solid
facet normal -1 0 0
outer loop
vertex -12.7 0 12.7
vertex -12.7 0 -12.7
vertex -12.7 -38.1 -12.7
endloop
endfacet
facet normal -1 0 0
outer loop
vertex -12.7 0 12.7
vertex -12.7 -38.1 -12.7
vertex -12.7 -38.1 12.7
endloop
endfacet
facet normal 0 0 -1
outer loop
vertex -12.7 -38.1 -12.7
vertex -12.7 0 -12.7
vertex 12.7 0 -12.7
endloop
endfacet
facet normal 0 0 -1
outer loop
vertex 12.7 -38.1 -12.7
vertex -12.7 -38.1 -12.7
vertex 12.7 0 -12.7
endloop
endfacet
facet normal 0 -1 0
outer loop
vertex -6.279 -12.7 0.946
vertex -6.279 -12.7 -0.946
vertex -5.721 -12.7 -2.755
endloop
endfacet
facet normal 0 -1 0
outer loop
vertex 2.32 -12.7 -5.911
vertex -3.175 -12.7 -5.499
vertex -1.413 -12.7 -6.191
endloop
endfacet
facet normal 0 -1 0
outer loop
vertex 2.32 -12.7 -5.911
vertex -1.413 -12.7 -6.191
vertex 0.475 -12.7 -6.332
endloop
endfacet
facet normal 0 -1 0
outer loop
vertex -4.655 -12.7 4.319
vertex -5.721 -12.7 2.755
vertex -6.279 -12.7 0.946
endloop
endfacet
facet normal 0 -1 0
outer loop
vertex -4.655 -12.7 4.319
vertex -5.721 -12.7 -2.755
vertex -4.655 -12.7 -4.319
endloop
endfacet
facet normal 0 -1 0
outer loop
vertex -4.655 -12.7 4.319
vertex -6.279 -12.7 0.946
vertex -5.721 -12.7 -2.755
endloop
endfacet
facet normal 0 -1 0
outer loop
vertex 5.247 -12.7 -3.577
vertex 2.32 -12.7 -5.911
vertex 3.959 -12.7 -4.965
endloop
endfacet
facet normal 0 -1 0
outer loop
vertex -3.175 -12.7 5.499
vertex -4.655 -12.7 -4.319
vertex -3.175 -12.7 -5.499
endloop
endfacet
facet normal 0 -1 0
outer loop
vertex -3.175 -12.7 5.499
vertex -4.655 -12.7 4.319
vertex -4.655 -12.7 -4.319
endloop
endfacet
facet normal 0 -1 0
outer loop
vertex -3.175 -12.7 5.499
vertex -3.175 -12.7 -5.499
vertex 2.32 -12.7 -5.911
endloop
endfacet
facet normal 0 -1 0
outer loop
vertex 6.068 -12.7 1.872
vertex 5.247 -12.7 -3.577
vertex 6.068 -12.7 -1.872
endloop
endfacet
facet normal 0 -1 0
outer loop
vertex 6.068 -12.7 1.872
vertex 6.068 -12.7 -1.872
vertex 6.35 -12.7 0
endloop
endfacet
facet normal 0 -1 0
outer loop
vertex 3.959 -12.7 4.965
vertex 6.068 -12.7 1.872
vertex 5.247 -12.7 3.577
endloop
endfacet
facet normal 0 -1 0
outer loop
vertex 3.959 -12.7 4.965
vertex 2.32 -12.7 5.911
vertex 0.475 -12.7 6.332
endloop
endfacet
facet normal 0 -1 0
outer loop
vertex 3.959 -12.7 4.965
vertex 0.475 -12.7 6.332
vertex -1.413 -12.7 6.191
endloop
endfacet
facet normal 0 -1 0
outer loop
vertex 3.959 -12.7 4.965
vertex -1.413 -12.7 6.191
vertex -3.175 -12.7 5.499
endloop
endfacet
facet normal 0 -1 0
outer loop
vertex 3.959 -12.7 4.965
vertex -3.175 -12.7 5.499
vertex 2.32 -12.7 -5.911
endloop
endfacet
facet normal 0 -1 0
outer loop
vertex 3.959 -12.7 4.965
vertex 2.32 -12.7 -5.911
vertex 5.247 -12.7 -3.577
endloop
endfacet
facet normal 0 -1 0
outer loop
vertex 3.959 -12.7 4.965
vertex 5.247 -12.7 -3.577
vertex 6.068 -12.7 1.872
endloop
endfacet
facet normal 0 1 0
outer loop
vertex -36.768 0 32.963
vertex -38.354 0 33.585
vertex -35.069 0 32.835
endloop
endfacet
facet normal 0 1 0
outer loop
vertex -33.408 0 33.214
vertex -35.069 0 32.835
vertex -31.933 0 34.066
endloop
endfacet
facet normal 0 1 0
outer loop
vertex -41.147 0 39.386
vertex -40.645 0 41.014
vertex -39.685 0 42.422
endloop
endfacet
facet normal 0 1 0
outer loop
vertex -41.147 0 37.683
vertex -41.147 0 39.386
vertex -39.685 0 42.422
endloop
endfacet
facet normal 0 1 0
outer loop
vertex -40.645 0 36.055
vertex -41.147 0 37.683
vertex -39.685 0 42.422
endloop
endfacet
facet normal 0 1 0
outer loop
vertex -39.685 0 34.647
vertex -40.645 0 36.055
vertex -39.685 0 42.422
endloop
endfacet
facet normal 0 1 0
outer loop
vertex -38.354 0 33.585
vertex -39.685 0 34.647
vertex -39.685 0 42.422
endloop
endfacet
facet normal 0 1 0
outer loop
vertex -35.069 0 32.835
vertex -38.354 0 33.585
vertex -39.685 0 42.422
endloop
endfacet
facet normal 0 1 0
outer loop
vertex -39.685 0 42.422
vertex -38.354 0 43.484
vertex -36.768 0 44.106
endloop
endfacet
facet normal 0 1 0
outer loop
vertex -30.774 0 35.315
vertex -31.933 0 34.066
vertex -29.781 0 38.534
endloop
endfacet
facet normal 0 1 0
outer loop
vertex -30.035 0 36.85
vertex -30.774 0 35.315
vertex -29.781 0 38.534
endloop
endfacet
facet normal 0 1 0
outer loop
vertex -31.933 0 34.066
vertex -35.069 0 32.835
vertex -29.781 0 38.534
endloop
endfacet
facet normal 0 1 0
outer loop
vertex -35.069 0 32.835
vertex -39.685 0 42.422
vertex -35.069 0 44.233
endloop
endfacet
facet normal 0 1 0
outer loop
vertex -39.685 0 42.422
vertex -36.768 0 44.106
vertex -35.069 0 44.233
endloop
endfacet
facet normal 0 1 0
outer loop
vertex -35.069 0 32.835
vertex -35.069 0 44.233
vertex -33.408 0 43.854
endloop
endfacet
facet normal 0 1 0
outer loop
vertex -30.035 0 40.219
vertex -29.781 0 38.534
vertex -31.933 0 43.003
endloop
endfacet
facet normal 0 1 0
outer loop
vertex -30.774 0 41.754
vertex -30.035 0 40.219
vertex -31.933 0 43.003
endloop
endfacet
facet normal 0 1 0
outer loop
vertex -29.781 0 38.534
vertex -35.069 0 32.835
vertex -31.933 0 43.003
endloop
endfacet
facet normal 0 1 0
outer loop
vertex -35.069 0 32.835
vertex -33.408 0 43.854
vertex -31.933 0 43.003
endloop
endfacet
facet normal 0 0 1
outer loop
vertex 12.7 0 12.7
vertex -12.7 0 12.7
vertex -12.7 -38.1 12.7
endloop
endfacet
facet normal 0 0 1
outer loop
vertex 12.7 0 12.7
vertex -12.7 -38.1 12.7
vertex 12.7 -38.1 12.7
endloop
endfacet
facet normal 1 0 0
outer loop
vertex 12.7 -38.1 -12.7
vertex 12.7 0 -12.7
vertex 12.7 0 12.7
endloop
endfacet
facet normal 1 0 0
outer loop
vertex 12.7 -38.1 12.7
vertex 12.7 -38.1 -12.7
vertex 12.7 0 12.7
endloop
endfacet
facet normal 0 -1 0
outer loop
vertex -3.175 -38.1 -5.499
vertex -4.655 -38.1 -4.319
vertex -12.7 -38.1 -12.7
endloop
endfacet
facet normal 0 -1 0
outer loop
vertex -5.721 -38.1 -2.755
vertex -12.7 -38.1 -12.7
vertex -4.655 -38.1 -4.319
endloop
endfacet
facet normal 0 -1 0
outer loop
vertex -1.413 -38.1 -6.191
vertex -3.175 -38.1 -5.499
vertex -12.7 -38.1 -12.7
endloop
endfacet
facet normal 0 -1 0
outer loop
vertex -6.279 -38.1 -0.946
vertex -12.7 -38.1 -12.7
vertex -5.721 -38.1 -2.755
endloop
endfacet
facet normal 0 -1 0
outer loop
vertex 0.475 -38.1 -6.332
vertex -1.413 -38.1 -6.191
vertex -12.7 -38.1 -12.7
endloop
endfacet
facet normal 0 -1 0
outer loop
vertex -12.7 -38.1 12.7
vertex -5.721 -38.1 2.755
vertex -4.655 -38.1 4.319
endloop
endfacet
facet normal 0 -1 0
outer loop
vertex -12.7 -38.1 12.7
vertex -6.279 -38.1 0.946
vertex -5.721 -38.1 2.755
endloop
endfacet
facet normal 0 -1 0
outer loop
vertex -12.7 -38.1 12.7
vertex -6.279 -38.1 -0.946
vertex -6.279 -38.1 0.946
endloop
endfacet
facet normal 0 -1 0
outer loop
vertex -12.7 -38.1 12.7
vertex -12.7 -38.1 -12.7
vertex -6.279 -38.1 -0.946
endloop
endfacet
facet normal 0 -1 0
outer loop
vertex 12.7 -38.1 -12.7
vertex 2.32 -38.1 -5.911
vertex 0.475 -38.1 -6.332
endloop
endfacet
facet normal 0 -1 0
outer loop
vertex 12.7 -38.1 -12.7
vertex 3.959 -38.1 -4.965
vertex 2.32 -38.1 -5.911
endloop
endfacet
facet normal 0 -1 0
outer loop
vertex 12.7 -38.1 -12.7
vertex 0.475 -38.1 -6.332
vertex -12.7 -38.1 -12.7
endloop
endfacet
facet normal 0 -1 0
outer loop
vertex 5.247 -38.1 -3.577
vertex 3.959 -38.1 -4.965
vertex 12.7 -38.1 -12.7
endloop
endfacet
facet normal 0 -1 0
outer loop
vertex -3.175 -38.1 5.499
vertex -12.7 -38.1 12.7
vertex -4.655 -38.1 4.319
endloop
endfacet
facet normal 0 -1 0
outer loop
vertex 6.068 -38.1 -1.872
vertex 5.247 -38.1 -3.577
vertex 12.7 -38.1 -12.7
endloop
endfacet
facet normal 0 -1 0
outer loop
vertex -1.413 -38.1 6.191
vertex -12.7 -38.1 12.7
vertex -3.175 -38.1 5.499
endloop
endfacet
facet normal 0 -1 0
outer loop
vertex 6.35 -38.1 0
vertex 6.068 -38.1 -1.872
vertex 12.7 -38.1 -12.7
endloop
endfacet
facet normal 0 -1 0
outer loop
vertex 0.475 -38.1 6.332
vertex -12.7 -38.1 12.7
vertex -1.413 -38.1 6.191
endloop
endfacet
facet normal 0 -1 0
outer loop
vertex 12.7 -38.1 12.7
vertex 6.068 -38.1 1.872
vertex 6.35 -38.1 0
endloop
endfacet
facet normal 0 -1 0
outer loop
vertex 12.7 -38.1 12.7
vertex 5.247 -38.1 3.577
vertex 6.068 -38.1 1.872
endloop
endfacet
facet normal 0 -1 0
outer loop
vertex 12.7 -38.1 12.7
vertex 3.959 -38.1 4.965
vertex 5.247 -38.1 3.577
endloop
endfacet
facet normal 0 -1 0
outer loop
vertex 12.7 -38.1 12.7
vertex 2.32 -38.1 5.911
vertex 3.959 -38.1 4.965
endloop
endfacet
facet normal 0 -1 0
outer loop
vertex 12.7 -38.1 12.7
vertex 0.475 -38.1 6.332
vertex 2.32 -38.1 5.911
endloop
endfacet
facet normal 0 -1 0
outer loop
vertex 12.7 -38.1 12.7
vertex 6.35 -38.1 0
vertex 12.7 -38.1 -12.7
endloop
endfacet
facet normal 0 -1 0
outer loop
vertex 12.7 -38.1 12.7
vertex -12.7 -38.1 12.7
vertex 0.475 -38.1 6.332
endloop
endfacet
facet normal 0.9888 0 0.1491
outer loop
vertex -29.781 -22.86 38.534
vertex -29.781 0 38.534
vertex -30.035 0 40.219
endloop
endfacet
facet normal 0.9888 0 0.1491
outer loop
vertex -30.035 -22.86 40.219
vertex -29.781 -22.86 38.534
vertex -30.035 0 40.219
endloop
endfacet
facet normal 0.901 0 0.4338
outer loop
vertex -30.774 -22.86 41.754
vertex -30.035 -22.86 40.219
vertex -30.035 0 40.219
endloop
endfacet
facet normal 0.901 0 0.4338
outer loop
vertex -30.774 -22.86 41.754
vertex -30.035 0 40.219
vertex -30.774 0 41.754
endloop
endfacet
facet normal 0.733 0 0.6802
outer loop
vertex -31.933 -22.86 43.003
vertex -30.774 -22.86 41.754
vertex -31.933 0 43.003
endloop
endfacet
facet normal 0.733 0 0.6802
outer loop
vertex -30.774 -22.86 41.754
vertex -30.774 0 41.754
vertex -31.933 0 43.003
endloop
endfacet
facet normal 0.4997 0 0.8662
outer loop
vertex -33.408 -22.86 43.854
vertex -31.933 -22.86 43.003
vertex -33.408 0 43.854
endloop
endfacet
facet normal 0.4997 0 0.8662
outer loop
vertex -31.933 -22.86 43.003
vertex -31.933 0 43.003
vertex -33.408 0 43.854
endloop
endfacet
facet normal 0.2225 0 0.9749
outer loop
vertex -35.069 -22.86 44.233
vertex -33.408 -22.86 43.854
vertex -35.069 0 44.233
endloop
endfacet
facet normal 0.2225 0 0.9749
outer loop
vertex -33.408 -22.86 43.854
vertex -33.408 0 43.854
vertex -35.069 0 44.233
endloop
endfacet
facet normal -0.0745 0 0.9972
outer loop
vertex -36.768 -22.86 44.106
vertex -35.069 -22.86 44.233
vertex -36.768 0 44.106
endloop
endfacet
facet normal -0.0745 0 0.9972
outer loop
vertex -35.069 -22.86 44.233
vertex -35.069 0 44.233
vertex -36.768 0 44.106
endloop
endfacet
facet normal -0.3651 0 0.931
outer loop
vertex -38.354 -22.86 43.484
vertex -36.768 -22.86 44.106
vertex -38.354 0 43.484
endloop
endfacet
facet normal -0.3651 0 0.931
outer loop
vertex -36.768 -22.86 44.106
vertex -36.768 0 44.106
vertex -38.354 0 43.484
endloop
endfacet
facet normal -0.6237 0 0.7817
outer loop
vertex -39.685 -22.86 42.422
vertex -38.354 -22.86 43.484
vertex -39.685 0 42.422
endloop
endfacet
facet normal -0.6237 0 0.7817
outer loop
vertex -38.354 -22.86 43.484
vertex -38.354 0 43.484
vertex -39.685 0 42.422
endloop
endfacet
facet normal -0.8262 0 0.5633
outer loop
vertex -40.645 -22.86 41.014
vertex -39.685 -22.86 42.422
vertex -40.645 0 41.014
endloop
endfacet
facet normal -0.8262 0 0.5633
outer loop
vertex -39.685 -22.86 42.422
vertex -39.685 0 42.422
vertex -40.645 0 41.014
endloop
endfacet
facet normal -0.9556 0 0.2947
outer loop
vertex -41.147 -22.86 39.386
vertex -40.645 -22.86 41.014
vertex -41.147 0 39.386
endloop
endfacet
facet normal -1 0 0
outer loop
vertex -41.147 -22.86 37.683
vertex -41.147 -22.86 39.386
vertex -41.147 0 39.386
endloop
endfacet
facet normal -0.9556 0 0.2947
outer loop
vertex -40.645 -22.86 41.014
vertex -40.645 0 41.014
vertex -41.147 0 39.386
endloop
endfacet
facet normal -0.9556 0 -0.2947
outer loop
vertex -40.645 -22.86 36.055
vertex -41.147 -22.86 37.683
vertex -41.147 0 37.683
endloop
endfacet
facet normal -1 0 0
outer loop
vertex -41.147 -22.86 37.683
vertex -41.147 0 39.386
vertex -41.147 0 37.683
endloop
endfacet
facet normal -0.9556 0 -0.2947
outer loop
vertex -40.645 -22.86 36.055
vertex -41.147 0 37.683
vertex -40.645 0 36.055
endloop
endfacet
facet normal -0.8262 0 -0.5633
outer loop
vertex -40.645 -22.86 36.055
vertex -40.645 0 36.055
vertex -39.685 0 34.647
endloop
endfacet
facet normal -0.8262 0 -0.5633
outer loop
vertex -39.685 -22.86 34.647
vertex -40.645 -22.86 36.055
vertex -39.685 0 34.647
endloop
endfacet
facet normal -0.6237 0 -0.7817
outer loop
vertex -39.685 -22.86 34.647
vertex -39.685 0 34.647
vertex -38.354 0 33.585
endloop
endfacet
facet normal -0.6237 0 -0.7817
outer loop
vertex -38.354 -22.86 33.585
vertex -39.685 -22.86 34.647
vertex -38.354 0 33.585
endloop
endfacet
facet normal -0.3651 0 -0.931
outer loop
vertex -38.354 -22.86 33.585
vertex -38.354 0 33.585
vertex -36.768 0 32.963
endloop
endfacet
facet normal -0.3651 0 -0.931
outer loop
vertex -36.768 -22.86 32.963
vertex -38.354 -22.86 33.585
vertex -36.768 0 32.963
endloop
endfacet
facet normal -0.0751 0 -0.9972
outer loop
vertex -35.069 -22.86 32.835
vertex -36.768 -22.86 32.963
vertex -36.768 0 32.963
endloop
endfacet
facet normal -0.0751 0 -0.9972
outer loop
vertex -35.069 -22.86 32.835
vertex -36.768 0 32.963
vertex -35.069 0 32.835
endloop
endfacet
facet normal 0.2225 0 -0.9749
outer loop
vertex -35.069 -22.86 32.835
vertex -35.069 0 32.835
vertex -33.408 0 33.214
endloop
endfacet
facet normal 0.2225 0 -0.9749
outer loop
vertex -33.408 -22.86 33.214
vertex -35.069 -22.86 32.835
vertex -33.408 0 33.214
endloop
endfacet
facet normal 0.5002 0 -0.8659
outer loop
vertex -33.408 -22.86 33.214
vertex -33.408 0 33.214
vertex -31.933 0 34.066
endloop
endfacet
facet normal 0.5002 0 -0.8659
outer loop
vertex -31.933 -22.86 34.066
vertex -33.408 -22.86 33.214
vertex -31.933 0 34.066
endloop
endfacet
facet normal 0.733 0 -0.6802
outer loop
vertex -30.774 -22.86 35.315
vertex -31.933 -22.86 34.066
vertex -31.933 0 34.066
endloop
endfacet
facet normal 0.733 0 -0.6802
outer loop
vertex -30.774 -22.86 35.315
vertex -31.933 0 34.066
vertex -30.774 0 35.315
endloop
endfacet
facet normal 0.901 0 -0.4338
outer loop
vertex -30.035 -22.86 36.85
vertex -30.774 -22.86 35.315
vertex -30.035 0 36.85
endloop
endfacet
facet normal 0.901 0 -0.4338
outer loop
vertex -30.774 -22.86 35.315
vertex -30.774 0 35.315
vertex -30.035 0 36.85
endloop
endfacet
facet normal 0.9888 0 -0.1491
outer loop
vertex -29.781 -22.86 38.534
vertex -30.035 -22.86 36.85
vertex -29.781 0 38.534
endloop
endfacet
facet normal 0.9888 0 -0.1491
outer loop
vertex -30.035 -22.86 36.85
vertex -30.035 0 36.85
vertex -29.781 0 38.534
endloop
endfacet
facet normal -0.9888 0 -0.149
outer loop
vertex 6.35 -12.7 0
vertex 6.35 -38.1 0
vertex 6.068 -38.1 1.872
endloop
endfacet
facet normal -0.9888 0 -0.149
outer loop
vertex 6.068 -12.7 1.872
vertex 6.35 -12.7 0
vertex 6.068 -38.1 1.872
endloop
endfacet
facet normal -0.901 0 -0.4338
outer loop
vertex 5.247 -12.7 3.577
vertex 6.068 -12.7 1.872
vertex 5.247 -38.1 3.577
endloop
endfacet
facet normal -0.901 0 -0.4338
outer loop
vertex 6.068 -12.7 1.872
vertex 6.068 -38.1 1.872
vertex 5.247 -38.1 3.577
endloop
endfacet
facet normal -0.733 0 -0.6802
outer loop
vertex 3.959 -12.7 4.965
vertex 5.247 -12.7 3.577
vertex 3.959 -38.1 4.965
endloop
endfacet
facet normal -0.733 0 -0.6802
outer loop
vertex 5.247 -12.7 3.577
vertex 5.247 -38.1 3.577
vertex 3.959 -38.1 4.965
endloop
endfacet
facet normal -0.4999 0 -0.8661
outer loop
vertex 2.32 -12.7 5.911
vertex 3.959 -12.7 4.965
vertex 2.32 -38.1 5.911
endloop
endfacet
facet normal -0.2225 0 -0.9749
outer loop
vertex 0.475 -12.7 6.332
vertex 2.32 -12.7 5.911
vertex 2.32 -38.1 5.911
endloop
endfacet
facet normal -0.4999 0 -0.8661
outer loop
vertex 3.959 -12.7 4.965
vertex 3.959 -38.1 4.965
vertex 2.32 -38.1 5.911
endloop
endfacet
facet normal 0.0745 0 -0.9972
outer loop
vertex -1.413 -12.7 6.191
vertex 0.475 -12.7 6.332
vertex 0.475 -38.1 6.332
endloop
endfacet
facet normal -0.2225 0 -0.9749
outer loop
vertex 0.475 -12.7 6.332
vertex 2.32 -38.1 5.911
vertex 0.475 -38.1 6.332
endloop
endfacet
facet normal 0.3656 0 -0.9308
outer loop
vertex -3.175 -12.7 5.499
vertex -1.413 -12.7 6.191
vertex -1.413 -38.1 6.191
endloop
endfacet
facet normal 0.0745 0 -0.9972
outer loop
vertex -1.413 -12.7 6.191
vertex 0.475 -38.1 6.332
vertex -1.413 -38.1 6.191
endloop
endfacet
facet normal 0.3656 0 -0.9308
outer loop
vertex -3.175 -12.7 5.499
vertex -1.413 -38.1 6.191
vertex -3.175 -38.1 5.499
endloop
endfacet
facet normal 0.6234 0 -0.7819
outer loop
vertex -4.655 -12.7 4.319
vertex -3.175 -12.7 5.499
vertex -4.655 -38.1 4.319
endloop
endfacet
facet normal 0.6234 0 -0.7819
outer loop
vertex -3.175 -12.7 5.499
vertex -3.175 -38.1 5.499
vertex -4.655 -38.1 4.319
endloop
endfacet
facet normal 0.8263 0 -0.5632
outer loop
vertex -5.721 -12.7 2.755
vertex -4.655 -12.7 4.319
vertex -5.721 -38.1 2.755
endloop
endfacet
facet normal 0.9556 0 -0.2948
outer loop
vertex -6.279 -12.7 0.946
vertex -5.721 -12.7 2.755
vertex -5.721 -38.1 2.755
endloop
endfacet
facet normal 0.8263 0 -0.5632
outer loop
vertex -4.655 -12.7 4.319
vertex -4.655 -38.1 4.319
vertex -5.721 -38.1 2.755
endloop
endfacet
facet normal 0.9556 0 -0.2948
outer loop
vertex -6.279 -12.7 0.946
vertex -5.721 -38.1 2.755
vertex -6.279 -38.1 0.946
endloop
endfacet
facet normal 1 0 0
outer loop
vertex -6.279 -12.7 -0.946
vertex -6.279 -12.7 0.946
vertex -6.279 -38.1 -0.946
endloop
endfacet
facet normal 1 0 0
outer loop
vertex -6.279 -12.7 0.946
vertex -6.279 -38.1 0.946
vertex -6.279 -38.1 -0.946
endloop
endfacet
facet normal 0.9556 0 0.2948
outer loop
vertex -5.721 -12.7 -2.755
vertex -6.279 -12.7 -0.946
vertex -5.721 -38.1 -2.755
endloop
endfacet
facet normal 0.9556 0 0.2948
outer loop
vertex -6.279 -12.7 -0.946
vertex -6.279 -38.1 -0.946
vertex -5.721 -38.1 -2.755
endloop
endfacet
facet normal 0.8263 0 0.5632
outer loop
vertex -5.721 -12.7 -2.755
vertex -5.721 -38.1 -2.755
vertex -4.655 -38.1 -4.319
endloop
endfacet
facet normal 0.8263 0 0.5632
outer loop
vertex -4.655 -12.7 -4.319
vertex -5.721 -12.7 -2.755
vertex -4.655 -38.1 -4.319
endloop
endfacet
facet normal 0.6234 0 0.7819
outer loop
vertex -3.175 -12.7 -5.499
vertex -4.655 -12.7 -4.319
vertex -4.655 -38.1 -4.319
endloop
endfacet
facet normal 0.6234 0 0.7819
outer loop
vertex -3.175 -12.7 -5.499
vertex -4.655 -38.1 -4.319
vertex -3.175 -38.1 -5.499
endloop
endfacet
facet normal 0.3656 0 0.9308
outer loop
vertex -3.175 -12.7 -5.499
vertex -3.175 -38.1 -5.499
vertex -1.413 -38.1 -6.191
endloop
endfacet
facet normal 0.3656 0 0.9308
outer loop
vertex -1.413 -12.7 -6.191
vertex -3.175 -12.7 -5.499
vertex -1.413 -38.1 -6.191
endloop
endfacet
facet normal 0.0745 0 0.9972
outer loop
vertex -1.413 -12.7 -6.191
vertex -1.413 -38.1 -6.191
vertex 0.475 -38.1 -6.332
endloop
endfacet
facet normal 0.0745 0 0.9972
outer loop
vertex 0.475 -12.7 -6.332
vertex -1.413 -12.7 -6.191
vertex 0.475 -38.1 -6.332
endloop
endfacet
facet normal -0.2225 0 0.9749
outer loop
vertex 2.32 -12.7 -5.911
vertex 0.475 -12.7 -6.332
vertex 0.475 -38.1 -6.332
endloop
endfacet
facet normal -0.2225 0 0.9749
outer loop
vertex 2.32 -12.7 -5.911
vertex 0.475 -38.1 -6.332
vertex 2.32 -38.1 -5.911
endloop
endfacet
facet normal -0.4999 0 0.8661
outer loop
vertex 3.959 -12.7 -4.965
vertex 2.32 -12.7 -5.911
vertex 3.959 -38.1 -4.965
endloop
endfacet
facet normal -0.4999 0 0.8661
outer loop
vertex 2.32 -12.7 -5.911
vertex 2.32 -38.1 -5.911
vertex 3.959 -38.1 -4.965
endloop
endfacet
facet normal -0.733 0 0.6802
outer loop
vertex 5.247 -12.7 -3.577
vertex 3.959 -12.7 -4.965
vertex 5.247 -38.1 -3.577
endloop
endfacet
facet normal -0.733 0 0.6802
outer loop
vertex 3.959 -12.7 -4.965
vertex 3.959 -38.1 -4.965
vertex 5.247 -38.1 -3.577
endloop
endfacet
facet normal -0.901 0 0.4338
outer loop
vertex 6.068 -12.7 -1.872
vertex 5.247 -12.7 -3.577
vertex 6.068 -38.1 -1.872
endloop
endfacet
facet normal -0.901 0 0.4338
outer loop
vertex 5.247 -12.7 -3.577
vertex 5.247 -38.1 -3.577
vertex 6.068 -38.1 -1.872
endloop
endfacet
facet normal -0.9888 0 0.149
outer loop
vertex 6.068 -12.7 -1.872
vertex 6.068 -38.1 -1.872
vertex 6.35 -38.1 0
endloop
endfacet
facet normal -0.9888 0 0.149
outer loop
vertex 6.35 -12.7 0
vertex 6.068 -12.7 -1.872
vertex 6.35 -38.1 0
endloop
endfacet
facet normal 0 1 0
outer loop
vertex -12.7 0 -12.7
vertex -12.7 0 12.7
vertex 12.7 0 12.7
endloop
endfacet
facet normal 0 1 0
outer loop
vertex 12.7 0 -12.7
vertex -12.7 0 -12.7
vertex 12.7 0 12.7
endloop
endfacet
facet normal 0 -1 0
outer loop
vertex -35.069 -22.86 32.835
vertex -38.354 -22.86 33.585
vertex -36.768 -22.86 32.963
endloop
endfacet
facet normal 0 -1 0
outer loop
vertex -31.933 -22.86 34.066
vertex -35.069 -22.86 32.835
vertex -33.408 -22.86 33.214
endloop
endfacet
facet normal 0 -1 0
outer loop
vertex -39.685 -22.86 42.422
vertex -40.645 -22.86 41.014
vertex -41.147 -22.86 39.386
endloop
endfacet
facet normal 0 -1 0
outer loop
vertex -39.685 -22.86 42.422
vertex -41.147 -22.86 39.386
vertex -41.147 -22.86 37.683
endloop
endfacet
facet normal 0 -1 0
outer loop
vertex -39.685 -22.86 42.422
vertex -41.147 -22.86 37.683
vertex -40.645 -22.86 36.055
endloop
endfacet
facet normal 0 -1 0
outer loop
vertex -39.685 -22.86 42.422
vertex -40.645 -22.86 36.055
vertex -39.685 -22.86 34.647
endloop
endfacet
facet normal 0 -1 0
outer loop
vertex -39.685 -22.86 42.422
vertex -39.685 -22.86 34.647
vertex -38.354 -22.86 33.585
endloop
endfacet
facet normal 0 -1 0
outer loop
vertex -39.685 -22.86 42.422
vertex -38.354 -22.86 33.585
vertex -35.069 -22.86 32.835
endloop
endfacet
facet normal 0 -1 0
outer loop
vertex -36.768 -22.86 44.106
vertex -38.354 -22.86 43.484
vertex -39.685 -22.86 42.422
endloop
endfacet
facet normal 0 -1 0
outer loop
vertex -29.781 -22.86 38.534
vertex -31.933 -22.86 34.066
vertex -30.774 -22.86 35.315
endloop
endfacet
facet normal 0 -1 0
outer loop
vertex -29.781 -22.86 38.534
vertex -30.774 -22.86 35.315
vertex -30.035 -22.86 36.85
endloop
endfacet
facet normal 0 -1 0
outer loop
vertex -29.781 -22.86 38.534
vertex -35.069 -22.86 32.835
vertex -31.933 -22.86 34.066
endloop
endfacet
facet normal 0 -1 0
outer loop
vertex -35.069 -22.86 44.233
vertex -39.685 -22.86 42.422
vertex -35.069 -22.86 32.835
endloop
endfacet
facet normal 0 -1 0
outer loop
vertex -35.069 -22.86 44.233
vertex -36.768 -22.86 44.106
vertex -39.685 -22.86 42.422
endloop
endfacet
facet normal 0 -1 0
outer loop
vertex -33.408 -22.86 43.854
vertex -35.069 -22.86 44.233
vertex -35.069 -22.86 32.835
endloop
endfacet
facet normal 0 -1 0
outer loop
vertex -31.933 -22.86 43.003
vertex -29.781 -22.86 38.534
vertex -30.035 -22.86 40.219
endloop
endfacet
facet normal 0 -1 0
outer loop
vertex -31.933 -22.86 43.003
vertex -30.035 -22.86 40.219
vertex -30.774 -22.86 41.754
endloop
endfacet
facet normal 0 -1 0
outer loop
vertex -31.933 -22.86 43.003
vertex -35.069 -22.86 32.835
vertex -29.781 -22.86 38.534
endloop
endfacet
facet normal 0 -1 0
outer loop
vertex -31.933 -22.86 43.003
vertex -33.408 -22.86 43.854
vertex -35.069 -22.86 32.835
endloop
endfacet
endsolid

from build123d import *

# Parameters (mm, degrees)
F0_W     = 25.4
F0_H     = 25.4
F1_DEPTH = 38.1
F2_R     = 6.35
F3_DEPTH = 25.4
F4_R     = 5.715
F5_DEPTH = 22.86


with BuildPart() as f1:
    # F0 (on Front) → F1 (new body)
    with BuildSketch(Plane.XZ):
        Rectangle(F0_W, F0_H)
    extrude(amount=F1_DEPTH)

    # F2 (on face) → F3 (cut)
    with BuildSketch(Plane.XZ.offset(38.1)):
        Circle(F2_R)
    extrude(amount=-F3_DEPTH, mode=Mode.SUBTRACT)


with BuildPart() as f5:
    # F4 (on Front) → F5 (new body)
    with BuildSketch(Plane.XZ):
        with Locations((-35.496078, 38.534407)):
            Circle(F4_R)
    extrude(amount=F5_DEPTH)


solid = Compound([f1.part, f5.part])
